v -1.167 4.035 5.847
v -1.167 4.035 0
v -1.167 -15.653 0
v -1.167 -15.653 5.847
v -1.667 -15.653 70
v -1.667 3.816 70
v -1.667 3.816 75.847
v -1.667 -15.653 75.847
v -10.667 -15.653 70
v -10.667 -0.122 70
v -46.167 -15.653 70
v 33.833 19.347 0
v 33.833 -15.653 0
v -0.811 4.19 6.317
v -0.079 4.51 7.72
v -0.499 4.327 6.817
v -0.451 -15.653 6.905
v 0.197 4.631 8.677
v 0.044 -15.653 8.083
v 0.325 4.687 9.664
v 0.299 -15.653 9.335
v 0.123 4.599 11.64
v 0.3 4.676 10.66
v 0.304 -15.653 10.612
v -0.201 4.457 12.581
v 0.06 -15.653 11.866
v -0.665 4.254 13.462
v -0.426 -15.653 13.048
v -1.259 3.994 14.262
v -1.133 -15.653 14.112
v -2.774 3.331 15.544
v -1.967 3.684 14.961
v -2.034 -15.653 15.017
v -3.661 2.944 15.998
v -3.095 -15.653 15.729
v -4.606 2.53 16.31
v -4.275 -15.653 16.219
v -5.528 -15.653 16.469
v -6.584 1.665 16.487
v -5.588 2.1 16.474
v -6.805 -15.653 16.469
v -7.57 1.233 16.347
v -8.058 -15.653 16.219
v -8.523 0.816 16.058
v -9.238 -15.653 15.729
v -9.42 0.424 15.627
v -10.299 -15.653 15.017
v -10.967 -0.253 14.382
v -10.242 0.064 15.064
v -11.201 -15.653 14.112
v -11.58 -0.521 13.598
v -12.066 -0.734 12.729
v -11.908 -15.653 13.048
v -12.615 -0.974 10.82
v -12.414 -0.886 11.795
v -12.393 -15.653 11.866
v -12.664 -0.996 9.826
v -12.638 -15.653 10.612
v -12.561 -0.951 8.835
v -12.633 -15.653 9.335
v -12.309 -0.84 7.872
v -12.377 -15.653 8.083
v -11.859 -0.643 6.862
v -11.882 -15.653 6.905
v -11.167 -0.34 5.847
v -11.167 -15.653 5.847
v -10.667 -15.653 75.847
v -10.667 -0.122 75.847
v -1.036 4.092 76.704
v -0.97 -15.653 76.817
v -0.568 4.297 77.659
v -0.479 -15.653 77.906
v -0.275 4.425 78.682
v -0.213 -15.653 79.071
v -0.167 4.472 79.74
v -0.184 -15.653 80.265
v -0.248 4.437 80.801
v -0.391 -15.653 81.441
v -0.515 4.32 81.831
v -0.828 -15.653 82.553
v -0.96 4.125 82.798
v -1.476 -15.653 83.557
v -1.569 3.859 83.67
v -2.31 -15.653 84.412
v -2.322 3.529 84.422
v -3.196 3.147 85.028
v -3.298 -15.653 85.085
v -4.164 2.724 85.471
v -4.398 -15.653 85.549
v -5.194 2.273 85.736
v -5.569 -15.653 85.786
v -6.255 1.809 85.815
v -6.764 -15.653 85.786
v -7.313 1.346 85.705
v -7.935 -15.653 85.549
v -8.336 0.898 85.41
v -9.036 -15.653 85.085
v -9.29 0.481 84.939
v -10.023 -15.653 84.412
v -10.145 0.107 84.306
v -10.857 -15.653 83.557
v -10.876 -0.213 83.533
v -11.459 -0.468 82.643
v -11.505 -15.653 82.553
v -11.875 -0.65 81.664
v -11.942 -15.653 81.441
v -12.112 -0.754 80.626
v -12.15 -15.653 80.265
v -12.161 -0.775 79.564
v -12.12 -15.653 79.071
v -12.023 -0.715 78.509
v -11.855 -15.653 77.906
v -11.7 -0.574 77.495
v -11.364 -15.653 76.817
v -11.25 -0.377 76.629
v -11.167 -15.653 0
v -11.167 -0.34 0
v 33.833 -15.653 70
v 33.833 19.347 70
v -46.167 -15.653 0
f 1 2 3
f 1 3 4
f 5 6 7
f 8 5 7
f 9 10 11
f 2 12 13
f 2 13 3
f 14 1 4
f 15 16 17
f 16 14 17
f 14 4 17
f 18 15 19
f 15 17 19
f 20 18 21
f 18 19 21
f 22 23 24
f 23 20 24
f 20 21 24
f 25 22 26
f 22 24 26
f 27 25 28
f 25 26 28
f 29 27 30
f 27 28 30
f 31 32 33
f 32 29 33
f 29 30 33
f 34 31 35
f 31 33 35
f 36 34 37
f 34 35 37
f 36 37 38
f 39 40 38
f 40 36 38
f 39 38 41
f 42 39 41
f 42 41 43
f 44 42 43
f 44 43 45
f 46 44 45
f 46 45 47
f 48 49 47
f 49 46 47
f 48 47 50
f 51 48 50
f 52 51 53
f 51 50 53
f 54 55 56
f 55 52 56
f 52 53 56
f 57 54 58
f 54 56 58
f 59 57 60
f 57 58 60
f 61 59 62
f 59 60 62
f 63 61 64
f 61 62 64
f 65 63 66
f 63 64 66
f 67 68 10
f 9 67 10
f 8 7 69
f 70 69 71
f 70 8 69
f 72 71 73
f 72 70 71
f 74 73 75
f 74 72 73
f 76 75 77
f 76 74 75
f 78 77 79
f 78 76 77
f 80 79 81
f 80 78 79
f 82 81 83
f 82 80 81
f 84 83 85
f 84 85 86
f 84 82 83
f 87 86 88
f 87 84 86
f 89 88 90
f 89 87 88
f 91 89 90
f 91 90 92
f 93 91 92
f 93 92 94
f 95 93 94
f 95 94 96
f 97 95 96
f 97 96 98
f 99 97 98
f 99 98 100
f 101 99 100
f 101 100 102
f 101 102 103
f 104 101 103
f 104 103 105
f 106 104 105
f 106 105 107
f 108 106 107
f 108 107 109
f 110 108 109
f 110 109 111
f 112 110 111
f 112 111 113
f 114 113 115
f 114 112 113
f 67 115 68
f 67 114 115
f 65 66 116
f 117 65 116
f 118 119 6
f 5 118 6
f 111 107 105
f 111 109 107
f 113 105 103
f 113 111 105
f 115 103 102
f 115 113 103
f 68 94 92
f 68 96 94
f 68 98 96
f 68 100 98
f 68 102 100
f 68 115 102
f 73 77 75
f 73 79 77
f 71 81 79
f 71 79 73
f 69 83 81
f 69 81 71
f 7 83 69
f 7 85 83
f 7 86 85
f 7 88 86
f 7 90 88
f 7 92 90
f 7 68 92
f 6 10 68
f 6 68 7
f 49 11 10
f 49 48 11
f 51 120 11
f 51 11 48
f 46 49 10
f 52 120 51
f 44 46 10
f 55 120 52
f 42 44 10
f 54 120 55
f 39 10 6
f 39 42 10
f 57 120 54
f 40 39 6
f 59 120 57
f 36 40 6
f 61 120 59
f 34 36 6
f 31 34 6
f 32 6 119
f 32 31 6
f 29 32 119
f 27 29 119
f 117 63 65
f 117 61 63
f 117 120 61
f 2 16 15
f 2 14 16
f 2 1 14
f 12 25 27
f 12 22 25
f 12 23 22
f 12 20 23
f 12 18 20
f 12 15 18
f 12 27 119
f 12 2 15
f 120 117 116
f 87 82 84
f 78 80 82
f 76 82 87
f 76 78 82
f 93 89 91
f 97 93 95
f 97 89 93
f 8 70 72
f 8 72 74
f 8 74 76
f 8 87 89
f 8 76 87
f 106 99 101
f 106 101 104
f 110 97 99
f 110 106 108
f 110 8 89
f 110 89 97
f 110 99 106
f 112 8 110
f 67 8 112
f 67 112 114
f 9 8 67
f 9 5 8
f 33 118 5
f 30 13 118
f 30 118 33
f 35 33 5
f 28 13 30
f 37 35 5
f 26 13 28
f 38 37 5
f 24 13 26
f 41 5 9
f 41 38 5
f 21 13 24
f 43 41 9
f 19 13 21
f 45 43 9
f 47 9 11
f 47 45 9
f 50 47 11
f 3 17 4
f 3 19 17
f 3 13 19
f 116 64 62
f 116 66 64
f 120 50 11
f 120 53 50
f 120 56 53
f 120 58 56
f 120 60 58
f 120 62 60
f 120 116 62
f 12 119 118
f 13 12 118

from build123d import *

# Parameters (mm, degrees)
RESSALTO_EXTRUS_O1_DEPTH = 70
RESSALTO_EXTRUS_O2_REACH = 92.865
CORTE_EXTRUS_O1_DEPTH    = 70


with BuildPart() as part:
    # Esboço1 → Ressalto-extrusão1 (new body)
    with BuildSketch(Plane.XY):
        Polygon((-46.166666667, -15.652777778), (33.833333333, 19.347222222), (33.833333333, -15.652777778), align=None)
    extrude(amount=RESSALTO_EXTRUS_O1_DEPTH)

    # Ressalto-extrusão2: up to this plane
    ressalto_extrus_o2_end = Plane(origin=(-46.166666667, -15.652777778, 70), z_dir=(0.4008188340197078, -0.9161573349021892, 0))
    # Esboço3 → Ressalto-extrusão2 (add, up to the surface)
    with BuildSketch(Plane.XZ.offset(15.652777778), mode=Mode.PRIVATE) as ressalto_extrus_o2_sk1:
        with BuildLine():
            Line((-10.666666667, 70), (-1.666666667, 70))
            Line((-1.666666667, 70), (-1.666666667, 75.846688069))
            ThreePointArc((-1.666666667, 75.846688069), (-6.166666667, 85.815315035), (-10.666666667, 75.846688069))
            Line((-10.666666667, 75.846688069), (-10.666666667, 70))
        make_face()
    ressalto_extrus_o2_tool1 = split(extrude(ressalto_extrus_o2_sk1.sketch, amount=-RESSALTO_EXTRUS_O2_REACH, mode=Mode.PRIVATE), bisect_by=ressalto_extrus_o2_end, keep=Keep.BOTH, mode=Mode.PRIVATE)
    add(ressalto_extrus_o2_tool1.solids().sort_by_distance((-6.166667, -15.652778, 77.842662))[0])

    # Esboço2 → Corte-extrusão1 (cut)
    with BuildSketch(Plane.XZ.offset(15.652777778)):
        with BuildLine():
            Line((-11.166666667, 0), (-1.166666667, 0))
            Line((-1.166666667, 0), (-1.166666667, 5.846688069))
            ThreePointArc((-1.166666667, 5.846688069), (-6.166666667, 16.5), (-11.166666667, 5.846688069))
            Line((-11.166666667, 5.846688069), (-11.166666667, 0))
        make_face()
    extrude(amount=-CORTE_EXTRUS_O1_DEPTH, mode=Mode.SUBTRACT)


solid = part.part
